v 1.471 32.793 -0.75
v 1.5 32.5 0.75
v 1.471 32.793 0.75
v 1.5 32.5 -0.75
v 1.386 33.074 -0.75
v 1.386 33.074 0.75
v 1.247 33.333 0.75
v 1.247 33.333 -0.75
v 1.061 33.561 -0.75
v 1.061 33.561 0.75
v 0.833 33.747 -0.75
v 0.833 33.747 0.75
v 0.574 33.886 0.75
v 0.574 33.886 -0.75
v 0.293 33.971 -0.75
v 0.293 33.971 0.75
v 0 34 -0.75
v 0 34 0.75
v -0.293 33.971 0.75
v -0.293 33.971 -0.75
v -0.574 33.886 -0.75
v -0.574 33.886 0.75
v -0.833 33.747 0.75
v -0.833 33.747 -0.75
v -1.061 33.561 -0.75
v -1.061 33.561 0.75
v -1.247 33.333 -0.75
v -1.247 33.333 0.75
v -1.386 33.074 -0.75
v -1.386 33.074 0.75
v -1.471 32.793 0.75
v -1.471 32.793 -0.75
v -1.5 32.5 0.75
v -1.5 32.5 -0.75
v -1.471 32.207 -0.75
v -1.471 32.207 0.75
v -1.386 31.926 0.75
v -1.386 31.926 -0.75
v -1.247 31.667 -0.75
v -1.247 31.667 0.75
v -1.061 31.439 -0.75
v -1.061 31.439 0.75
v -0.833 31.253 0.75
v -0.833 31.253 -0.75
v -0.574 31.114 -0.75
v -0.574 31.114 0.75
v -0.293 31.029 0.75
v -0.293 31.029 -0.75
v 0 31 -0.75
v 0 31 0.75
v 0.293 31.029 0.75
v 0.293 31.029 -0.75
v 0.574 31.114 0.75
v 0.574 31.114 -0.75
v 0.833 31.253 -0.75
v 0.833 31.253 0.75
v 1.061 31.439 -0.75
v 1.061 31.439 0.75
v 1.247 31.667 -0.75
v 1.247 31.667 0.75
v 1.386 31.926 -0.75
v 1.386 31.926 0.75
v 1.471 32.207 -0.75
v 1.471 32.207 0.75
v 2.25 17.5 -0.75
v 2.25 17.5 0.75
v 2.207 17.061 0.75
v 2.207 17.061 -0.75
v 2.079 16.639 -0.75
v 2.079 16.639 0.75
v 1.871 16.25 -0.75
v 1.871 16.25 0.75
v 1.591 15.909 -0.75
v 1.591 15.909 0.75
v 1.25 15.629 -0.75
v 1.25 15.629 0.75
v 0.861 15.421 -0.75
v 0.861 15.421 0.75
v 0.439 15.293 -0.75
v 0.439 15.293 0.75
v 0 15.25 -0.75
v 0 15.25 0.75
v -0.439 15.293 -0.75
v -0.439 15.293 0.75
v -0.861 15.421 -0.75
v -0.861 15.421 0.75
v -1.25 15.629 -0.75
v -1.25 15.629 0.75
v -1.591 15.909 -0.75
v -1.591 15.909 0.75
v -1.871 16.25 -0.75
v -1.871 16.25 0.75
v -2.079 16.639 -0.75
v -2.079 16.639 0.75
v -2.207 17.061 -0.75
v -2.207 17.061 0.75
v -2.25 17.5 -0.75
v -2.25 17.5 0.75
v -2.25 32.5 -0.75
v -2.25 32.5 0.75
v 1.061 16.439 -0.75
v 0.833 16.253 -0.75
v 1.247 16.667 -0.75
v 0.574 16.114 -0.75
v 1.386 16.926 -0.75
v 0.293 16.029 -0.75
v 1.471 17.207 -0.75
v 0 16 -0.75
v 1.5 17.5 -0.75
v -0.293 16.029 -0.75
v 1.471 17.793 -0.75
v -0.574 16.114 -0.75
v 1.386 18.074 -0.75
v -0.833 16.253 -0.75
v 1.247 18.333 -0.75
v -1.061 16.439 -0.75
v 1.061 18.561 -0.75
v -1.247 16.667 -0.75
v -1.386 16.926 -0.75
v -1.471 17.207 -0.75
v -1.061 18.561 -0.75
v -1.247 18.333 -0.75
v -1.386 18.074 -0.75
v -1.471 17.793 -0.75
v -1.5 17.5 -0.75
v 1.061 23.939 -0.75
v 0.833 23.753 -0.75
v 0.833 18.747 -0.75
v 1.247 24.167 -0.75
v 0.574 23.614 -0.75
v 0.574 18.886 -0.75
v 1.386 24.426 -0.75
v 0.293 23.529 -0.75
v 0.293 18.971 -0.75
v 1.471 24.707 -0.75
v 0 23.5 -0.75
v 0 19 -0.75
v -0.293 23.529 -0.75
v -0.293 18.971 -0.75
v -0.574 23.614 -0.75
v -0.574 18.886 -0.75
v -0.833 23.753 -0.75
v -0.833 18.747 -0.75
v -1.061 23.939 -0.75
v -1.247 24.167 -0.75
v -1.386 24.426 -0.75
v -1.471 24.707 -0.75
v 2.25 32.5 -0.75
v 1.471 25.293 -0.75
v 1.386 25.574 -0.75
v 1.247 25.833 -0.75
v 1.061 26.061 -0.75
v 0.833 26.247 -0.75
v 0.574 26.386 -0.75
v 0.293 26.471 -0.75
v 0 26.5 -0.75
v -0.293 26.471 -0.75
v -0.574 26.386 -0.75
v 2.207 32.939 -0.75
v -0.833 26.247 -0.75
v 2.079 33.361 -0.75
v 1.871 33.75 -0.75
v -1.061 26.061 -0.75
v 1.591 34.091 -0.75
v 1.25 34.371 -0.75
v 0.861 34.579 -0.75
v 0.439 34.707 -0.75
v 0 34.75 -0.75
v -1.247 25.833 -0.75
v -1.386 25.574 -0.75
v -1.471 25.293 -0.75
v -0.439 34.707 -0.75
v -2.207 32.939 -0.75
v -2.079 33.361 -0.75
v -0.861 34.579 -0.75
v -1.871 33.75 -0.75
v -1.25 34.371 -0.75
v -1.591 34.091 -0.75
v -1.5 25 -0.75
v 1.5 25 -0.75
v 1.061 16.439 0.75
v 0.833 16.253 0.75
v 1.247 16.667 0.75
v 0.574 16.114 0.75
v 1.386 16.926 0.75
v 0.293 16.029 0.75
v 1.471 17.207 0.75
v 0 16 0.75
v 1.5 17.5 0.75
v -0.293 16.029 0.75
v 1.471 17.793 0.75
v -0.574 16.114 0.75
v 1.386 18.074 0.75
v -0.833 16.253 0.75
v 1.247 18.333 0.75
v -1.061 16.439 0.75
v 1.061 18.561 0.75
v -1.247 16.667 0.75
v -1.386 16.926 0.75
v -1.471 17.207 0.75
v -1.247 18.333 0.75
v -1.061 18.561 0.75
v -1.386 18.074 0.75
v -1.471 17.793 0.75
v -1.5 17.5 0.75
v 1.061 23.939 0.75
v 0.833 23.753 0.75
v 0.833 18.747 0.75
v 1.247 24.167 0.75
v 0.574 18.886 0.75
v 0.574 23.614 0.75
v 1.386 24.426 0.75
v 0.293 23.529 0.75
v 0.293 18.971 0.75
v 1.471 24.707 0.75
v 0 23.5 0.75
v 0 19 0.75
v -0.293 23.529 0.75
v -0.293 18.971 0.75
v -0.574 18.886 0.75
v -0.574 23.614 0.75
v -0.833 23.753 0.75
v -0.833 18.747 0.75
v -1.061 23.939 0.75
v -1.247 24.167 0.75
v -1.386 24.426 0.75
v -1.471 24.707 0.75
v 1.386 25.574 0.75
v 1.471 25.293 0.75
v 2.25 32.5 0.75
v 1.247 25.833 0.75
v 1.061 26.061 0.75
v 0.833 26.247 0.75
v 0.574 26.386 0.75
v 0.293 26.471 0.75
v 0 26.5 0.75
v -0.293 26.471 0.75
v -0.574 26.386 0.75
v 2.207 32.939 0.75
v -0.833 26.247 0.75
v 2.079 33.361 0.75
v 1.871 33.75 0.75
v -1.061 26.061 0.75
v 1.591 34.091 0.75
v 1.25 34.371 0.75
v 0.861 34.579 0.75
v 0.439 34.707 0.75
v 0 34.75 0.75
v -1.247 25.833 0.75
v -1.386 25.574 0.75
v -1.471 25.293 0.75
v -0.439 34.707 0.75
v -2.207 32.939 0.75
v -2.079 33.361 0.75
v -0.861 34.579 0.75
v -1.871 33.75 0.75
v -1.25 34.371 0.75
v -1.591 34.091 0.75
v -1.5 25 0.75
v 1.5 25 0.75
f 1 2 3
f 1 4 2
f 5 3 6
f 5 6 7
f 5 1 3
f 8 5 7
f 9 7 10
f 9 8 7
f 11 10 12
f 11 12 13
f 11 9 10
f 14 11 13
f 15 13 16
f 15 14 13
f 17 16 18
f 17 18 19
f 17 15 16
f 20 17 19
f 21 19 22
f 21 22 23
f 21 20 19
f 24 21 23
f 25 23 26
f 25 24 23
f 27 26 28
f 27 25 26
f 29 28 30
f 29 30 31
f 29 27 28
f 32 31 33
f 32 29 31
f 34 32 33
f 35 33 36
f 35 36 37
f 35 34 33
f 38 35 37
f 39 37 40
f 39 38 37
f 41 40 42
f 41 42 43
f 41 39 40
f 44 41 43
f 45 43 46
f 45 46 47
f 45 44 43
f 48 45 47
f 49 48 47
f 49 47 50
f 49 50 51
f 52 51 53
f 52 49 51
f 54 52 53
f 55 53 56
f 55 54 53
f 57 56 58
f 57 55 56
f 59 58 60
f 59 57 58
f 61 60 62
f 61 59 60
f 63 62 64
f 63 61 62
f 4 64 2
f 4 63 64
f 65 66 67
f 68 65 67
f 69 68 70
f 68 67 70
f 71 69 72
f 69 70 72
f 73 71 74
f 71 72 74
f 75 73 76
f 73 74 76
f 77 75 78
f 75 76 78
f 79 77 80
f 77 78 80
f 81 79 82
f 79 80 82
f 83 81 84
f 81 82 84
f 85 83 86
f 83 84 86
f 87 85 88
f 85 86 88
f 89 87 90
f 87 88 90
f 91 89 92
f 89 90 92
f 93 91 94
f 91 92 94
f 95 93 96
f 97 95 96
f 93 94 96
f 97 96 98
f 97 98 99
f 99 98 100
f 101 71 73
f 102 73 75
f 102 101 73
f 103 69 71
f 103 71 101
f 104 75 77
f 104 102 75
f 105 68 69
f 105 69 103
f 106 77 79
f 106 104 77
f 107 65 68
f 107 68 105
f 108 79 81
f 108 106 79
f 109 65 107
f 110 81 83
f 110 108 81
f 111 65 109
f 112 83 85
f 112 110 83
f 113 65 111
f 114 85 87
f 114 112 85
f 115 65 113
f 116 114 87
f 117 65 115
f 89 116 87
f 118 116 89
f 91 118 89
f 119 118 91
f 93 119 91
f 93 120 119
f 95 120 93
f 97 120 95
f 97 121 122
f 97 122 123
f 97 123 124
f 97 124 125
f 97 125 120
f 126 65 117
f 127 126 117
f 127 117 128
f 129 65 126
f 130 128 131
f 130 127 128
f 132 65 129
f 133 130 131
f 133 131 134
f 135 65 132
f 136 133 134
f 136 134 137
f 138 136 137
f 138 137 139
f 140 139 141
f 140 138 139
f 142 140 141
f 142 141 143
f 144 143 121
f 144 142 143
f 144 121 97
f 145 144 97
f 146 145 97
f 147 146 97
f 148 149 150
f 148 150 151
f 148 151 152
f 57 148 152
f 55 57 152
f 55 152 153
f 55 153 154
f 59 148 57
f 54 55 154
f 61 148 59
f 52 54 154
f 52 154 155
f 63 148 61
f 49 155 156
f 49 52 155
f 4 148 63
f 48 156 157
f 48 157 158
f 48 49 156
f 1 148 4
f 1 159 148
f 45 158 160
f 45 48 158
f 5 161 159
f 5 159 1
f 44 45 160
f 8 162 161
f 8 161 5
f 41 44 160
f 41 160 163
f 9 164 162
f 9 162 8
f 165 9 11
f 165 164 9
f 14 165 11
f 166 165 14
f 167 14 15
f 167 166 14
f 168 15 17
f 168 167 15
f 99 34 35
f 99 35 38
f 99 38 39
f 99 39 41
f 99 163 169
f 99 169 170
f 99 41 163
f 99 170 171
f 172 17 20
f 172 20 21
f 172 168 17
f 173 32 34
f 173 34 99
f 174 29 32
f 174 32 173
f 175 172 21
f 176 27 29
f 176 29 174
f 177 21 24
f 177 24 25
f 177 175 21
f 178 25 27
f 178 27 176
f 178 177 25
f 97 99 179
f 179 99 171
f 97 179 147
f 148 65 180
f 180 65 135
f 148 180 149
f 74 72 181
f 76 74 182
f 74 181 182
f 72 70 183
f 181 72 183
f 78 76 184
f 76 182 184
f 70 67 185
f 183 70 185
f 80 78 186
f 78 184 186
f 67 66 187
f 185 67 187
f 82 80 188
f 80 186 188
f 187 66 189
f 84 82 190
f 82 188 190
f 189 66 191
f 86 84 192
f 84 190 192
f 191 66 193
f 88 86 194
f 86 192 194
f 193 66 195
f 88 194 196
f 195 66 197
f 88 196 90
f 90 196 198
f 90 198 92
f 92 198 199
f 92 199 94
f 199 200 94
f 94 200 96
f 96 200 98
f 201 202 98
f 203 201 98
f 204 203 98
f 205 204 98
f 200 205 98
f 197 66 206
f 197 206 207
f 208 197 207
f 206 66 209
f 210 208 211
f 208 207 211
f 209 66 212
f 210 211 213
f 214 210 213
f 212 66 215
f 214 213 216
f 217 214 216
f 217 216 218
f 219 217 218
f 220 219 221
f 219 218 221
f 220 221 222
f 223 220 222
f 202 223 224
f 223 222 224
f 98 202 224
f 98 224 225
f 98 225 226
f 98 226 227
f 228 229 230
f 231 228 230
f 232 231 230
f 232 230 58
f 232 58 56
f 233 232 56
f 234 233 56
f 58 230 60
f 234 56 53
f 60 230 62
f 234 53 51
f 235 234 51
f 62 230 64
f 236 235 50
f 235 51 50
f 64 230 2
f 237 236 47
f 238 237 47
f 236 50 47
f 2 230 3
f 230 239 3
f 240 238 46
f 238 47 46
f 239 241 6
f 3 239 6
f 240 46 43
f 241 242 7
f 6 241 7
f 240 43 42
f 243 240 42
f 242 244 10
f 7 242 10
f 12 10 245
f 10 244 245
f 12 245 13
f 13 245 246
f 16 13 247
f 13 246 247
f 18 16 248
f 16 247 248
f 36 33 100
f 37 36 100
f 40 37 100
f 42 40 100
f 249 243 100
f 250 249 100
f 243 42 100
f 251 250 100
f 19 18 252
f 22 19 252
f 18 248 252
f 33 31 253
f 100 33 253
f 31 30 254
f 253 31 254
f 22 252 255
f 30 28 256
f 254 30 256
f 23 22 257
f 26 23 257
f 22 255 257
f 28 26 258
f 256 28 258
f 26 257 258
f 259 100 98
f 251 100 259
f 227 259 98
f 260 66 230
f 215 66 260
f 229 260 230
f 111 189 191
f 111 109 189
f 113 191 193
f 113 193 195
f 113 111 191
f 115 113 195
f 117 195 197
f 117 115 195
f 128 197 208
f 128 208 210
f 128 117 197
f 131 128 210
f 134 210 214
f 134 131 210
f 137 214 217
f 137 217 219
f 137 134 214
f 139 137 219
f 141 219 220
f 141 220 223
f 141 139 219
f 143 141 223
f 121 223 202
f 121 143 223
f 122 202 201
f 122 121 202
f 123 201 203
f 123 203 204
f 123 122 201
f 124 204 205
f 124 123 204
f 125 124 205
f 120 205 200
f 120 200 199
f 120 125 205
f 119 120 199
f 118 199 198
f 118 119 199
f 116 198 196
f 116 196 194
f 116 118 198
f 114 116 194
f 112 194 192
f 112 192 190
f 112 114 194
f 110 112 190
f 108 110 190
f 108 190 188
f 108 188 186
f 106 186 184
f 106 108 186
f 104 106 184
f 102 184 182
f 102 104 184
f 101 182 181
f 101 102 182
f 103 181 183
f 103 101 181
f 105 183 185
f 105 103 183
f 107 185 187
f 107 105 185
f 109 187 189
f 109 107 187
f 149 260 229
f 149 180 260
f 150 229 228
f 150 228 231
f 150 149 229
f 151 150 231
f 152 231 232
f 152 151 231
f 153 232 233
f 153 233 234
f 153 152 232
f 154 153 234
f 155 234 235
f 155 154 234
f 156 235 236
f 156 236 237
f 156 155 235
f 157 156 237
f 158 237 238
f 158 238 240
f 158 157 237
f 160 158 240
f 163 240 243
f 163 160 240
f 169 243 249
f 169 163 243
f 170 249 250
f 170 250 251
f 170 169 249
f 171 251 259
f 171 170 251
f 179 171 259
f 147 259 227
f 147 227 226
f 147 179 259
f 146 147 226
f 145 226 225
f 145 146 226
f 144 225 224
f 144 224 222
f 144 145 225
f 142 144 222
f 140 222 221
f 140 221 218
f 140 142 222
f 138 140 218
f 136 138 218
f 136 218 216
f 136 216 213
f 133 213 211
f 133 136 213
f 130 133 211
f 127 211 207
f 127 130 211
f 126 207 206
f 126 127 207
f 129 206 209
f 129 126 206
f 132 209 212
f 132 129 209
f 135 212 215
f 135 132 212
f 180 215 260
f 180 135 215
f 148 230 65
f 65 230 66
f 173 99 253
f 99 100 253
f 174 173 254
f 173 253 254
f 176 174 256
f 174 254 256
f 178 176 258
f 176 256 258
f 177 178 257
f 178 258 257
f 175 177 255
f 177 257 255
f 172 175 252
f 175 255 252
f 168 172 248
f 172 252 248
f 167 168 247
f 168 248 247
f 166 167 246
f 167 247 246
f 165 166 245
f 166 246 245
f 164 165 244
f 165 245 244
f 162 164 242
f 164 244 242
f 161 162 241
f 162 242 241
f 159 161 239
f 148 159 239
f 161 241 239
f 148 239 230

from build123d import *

# Parameters (mm, degrees)
SKETCH1_R           = 5
BOSS_EXTRUDE1_DEPTH = 2.5
SCALE1_SCALE        = 0.3


with BuildPart() as part:
    # Sketch1 → Boss-Extrude1 (new body, symmetric)
    with BuildSketch(Plane.XY):
        with BuildLine():
            Line((-7.5, 0), (-7.5, 50))
            ThreePointArc((-7.5, 50), (0, 57.5), (7.5, 50))
            Line((7.5, 50), (7.5, 0))
            ThreePointArc((7.5, 0), (0, -7.5), (-7.5, 0))
        make_face()
        with Locations((0, 50)):
            Circle(SKETCH1_R, mode=Mode.SUBTRACT)
        with Locations((0, 25)):
            Circle(SKETCH1_R, mode=Mode.SUBTRACT)
        Circle(SKETCH1_R, mode=Mode.SUBTRACT)
    extrude(amount=BOSS_EXTRUDE1_DEPTH, both=True)


with BuildPart() as part_1:
    # Scale1: scaled about (0, 25, 0)
    add(part.part.scale(SCALE1_SCALE).moved(Location((0, 17.5, 0))))


solid = part_1.part
